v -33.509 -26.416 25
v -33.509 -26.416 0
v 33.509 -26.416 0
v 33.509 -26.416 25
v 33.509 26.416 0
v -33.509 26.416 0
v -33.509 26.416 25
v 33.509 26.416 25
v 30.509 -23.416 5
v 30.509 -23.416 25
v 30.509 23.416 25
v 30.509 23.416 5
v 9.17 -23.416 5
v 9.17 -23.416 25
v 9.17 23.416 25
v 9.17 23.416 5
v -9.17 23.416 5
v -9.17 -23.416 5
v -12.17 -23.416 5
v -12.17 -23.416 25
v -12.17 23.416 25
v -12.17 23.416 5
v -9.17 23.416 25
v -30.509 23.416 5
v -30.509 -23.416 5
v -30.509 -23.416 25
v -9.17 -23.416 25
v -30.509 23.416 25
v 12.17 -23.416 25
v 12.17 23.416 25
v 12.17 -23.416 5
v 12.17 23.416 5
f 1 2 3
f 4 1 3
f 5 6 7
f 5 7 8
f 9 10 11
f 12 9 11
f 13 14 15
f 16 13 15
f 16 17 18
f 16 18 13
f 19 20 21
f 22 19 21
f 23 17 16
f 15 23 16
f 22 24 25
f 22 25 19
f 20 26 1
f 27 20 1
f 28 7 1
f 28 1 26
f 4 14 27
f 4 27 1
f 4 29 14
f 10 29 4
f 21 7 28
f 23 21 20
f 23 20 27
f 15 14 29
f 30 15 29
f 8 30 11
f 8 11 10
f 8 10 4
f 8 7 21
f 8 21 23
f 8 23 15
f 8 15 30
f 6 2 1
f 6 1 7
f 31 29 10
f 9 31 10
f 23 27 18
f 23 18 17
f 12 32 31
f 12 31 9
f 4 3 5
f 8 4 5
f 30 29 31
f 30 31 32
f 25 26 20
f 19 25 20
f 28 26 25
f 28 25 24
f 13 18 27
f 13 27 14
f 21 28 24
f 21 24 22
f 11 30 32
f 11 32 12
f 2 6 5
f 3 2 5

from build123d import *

# Parameters (mm, degrees)
F0_W     = 67.017666
F0_H     = 52.83216
F1_DEPTH = 25
F2_W     = 18.339222
F2_H     = 46.83216
F3_DEPTH = 20


with BuildPart() as f1:
    # F0 (on Top) → F1 (new body)
    with BuildSketch(Plane.XY):
        Rectangle(F0_W, F0_H)
    extrude(amount=F1_DEPTH)

    # F2 (on face) → F3 (cut)
    with BuildSketch(Plane.XY.offset(25)):
        with Locations((-21.339222, 0)):
            Rectangle(F2_W, F2_H)
        Rectangle(F2_W, F2_H)
        with Locations((21.339222, 0)):
            Rectangle(F2_W, F2_H)
    extrude(amount=-F3_DEPTH, mode=Mode.SUBTRACT)


solid = f1.part
